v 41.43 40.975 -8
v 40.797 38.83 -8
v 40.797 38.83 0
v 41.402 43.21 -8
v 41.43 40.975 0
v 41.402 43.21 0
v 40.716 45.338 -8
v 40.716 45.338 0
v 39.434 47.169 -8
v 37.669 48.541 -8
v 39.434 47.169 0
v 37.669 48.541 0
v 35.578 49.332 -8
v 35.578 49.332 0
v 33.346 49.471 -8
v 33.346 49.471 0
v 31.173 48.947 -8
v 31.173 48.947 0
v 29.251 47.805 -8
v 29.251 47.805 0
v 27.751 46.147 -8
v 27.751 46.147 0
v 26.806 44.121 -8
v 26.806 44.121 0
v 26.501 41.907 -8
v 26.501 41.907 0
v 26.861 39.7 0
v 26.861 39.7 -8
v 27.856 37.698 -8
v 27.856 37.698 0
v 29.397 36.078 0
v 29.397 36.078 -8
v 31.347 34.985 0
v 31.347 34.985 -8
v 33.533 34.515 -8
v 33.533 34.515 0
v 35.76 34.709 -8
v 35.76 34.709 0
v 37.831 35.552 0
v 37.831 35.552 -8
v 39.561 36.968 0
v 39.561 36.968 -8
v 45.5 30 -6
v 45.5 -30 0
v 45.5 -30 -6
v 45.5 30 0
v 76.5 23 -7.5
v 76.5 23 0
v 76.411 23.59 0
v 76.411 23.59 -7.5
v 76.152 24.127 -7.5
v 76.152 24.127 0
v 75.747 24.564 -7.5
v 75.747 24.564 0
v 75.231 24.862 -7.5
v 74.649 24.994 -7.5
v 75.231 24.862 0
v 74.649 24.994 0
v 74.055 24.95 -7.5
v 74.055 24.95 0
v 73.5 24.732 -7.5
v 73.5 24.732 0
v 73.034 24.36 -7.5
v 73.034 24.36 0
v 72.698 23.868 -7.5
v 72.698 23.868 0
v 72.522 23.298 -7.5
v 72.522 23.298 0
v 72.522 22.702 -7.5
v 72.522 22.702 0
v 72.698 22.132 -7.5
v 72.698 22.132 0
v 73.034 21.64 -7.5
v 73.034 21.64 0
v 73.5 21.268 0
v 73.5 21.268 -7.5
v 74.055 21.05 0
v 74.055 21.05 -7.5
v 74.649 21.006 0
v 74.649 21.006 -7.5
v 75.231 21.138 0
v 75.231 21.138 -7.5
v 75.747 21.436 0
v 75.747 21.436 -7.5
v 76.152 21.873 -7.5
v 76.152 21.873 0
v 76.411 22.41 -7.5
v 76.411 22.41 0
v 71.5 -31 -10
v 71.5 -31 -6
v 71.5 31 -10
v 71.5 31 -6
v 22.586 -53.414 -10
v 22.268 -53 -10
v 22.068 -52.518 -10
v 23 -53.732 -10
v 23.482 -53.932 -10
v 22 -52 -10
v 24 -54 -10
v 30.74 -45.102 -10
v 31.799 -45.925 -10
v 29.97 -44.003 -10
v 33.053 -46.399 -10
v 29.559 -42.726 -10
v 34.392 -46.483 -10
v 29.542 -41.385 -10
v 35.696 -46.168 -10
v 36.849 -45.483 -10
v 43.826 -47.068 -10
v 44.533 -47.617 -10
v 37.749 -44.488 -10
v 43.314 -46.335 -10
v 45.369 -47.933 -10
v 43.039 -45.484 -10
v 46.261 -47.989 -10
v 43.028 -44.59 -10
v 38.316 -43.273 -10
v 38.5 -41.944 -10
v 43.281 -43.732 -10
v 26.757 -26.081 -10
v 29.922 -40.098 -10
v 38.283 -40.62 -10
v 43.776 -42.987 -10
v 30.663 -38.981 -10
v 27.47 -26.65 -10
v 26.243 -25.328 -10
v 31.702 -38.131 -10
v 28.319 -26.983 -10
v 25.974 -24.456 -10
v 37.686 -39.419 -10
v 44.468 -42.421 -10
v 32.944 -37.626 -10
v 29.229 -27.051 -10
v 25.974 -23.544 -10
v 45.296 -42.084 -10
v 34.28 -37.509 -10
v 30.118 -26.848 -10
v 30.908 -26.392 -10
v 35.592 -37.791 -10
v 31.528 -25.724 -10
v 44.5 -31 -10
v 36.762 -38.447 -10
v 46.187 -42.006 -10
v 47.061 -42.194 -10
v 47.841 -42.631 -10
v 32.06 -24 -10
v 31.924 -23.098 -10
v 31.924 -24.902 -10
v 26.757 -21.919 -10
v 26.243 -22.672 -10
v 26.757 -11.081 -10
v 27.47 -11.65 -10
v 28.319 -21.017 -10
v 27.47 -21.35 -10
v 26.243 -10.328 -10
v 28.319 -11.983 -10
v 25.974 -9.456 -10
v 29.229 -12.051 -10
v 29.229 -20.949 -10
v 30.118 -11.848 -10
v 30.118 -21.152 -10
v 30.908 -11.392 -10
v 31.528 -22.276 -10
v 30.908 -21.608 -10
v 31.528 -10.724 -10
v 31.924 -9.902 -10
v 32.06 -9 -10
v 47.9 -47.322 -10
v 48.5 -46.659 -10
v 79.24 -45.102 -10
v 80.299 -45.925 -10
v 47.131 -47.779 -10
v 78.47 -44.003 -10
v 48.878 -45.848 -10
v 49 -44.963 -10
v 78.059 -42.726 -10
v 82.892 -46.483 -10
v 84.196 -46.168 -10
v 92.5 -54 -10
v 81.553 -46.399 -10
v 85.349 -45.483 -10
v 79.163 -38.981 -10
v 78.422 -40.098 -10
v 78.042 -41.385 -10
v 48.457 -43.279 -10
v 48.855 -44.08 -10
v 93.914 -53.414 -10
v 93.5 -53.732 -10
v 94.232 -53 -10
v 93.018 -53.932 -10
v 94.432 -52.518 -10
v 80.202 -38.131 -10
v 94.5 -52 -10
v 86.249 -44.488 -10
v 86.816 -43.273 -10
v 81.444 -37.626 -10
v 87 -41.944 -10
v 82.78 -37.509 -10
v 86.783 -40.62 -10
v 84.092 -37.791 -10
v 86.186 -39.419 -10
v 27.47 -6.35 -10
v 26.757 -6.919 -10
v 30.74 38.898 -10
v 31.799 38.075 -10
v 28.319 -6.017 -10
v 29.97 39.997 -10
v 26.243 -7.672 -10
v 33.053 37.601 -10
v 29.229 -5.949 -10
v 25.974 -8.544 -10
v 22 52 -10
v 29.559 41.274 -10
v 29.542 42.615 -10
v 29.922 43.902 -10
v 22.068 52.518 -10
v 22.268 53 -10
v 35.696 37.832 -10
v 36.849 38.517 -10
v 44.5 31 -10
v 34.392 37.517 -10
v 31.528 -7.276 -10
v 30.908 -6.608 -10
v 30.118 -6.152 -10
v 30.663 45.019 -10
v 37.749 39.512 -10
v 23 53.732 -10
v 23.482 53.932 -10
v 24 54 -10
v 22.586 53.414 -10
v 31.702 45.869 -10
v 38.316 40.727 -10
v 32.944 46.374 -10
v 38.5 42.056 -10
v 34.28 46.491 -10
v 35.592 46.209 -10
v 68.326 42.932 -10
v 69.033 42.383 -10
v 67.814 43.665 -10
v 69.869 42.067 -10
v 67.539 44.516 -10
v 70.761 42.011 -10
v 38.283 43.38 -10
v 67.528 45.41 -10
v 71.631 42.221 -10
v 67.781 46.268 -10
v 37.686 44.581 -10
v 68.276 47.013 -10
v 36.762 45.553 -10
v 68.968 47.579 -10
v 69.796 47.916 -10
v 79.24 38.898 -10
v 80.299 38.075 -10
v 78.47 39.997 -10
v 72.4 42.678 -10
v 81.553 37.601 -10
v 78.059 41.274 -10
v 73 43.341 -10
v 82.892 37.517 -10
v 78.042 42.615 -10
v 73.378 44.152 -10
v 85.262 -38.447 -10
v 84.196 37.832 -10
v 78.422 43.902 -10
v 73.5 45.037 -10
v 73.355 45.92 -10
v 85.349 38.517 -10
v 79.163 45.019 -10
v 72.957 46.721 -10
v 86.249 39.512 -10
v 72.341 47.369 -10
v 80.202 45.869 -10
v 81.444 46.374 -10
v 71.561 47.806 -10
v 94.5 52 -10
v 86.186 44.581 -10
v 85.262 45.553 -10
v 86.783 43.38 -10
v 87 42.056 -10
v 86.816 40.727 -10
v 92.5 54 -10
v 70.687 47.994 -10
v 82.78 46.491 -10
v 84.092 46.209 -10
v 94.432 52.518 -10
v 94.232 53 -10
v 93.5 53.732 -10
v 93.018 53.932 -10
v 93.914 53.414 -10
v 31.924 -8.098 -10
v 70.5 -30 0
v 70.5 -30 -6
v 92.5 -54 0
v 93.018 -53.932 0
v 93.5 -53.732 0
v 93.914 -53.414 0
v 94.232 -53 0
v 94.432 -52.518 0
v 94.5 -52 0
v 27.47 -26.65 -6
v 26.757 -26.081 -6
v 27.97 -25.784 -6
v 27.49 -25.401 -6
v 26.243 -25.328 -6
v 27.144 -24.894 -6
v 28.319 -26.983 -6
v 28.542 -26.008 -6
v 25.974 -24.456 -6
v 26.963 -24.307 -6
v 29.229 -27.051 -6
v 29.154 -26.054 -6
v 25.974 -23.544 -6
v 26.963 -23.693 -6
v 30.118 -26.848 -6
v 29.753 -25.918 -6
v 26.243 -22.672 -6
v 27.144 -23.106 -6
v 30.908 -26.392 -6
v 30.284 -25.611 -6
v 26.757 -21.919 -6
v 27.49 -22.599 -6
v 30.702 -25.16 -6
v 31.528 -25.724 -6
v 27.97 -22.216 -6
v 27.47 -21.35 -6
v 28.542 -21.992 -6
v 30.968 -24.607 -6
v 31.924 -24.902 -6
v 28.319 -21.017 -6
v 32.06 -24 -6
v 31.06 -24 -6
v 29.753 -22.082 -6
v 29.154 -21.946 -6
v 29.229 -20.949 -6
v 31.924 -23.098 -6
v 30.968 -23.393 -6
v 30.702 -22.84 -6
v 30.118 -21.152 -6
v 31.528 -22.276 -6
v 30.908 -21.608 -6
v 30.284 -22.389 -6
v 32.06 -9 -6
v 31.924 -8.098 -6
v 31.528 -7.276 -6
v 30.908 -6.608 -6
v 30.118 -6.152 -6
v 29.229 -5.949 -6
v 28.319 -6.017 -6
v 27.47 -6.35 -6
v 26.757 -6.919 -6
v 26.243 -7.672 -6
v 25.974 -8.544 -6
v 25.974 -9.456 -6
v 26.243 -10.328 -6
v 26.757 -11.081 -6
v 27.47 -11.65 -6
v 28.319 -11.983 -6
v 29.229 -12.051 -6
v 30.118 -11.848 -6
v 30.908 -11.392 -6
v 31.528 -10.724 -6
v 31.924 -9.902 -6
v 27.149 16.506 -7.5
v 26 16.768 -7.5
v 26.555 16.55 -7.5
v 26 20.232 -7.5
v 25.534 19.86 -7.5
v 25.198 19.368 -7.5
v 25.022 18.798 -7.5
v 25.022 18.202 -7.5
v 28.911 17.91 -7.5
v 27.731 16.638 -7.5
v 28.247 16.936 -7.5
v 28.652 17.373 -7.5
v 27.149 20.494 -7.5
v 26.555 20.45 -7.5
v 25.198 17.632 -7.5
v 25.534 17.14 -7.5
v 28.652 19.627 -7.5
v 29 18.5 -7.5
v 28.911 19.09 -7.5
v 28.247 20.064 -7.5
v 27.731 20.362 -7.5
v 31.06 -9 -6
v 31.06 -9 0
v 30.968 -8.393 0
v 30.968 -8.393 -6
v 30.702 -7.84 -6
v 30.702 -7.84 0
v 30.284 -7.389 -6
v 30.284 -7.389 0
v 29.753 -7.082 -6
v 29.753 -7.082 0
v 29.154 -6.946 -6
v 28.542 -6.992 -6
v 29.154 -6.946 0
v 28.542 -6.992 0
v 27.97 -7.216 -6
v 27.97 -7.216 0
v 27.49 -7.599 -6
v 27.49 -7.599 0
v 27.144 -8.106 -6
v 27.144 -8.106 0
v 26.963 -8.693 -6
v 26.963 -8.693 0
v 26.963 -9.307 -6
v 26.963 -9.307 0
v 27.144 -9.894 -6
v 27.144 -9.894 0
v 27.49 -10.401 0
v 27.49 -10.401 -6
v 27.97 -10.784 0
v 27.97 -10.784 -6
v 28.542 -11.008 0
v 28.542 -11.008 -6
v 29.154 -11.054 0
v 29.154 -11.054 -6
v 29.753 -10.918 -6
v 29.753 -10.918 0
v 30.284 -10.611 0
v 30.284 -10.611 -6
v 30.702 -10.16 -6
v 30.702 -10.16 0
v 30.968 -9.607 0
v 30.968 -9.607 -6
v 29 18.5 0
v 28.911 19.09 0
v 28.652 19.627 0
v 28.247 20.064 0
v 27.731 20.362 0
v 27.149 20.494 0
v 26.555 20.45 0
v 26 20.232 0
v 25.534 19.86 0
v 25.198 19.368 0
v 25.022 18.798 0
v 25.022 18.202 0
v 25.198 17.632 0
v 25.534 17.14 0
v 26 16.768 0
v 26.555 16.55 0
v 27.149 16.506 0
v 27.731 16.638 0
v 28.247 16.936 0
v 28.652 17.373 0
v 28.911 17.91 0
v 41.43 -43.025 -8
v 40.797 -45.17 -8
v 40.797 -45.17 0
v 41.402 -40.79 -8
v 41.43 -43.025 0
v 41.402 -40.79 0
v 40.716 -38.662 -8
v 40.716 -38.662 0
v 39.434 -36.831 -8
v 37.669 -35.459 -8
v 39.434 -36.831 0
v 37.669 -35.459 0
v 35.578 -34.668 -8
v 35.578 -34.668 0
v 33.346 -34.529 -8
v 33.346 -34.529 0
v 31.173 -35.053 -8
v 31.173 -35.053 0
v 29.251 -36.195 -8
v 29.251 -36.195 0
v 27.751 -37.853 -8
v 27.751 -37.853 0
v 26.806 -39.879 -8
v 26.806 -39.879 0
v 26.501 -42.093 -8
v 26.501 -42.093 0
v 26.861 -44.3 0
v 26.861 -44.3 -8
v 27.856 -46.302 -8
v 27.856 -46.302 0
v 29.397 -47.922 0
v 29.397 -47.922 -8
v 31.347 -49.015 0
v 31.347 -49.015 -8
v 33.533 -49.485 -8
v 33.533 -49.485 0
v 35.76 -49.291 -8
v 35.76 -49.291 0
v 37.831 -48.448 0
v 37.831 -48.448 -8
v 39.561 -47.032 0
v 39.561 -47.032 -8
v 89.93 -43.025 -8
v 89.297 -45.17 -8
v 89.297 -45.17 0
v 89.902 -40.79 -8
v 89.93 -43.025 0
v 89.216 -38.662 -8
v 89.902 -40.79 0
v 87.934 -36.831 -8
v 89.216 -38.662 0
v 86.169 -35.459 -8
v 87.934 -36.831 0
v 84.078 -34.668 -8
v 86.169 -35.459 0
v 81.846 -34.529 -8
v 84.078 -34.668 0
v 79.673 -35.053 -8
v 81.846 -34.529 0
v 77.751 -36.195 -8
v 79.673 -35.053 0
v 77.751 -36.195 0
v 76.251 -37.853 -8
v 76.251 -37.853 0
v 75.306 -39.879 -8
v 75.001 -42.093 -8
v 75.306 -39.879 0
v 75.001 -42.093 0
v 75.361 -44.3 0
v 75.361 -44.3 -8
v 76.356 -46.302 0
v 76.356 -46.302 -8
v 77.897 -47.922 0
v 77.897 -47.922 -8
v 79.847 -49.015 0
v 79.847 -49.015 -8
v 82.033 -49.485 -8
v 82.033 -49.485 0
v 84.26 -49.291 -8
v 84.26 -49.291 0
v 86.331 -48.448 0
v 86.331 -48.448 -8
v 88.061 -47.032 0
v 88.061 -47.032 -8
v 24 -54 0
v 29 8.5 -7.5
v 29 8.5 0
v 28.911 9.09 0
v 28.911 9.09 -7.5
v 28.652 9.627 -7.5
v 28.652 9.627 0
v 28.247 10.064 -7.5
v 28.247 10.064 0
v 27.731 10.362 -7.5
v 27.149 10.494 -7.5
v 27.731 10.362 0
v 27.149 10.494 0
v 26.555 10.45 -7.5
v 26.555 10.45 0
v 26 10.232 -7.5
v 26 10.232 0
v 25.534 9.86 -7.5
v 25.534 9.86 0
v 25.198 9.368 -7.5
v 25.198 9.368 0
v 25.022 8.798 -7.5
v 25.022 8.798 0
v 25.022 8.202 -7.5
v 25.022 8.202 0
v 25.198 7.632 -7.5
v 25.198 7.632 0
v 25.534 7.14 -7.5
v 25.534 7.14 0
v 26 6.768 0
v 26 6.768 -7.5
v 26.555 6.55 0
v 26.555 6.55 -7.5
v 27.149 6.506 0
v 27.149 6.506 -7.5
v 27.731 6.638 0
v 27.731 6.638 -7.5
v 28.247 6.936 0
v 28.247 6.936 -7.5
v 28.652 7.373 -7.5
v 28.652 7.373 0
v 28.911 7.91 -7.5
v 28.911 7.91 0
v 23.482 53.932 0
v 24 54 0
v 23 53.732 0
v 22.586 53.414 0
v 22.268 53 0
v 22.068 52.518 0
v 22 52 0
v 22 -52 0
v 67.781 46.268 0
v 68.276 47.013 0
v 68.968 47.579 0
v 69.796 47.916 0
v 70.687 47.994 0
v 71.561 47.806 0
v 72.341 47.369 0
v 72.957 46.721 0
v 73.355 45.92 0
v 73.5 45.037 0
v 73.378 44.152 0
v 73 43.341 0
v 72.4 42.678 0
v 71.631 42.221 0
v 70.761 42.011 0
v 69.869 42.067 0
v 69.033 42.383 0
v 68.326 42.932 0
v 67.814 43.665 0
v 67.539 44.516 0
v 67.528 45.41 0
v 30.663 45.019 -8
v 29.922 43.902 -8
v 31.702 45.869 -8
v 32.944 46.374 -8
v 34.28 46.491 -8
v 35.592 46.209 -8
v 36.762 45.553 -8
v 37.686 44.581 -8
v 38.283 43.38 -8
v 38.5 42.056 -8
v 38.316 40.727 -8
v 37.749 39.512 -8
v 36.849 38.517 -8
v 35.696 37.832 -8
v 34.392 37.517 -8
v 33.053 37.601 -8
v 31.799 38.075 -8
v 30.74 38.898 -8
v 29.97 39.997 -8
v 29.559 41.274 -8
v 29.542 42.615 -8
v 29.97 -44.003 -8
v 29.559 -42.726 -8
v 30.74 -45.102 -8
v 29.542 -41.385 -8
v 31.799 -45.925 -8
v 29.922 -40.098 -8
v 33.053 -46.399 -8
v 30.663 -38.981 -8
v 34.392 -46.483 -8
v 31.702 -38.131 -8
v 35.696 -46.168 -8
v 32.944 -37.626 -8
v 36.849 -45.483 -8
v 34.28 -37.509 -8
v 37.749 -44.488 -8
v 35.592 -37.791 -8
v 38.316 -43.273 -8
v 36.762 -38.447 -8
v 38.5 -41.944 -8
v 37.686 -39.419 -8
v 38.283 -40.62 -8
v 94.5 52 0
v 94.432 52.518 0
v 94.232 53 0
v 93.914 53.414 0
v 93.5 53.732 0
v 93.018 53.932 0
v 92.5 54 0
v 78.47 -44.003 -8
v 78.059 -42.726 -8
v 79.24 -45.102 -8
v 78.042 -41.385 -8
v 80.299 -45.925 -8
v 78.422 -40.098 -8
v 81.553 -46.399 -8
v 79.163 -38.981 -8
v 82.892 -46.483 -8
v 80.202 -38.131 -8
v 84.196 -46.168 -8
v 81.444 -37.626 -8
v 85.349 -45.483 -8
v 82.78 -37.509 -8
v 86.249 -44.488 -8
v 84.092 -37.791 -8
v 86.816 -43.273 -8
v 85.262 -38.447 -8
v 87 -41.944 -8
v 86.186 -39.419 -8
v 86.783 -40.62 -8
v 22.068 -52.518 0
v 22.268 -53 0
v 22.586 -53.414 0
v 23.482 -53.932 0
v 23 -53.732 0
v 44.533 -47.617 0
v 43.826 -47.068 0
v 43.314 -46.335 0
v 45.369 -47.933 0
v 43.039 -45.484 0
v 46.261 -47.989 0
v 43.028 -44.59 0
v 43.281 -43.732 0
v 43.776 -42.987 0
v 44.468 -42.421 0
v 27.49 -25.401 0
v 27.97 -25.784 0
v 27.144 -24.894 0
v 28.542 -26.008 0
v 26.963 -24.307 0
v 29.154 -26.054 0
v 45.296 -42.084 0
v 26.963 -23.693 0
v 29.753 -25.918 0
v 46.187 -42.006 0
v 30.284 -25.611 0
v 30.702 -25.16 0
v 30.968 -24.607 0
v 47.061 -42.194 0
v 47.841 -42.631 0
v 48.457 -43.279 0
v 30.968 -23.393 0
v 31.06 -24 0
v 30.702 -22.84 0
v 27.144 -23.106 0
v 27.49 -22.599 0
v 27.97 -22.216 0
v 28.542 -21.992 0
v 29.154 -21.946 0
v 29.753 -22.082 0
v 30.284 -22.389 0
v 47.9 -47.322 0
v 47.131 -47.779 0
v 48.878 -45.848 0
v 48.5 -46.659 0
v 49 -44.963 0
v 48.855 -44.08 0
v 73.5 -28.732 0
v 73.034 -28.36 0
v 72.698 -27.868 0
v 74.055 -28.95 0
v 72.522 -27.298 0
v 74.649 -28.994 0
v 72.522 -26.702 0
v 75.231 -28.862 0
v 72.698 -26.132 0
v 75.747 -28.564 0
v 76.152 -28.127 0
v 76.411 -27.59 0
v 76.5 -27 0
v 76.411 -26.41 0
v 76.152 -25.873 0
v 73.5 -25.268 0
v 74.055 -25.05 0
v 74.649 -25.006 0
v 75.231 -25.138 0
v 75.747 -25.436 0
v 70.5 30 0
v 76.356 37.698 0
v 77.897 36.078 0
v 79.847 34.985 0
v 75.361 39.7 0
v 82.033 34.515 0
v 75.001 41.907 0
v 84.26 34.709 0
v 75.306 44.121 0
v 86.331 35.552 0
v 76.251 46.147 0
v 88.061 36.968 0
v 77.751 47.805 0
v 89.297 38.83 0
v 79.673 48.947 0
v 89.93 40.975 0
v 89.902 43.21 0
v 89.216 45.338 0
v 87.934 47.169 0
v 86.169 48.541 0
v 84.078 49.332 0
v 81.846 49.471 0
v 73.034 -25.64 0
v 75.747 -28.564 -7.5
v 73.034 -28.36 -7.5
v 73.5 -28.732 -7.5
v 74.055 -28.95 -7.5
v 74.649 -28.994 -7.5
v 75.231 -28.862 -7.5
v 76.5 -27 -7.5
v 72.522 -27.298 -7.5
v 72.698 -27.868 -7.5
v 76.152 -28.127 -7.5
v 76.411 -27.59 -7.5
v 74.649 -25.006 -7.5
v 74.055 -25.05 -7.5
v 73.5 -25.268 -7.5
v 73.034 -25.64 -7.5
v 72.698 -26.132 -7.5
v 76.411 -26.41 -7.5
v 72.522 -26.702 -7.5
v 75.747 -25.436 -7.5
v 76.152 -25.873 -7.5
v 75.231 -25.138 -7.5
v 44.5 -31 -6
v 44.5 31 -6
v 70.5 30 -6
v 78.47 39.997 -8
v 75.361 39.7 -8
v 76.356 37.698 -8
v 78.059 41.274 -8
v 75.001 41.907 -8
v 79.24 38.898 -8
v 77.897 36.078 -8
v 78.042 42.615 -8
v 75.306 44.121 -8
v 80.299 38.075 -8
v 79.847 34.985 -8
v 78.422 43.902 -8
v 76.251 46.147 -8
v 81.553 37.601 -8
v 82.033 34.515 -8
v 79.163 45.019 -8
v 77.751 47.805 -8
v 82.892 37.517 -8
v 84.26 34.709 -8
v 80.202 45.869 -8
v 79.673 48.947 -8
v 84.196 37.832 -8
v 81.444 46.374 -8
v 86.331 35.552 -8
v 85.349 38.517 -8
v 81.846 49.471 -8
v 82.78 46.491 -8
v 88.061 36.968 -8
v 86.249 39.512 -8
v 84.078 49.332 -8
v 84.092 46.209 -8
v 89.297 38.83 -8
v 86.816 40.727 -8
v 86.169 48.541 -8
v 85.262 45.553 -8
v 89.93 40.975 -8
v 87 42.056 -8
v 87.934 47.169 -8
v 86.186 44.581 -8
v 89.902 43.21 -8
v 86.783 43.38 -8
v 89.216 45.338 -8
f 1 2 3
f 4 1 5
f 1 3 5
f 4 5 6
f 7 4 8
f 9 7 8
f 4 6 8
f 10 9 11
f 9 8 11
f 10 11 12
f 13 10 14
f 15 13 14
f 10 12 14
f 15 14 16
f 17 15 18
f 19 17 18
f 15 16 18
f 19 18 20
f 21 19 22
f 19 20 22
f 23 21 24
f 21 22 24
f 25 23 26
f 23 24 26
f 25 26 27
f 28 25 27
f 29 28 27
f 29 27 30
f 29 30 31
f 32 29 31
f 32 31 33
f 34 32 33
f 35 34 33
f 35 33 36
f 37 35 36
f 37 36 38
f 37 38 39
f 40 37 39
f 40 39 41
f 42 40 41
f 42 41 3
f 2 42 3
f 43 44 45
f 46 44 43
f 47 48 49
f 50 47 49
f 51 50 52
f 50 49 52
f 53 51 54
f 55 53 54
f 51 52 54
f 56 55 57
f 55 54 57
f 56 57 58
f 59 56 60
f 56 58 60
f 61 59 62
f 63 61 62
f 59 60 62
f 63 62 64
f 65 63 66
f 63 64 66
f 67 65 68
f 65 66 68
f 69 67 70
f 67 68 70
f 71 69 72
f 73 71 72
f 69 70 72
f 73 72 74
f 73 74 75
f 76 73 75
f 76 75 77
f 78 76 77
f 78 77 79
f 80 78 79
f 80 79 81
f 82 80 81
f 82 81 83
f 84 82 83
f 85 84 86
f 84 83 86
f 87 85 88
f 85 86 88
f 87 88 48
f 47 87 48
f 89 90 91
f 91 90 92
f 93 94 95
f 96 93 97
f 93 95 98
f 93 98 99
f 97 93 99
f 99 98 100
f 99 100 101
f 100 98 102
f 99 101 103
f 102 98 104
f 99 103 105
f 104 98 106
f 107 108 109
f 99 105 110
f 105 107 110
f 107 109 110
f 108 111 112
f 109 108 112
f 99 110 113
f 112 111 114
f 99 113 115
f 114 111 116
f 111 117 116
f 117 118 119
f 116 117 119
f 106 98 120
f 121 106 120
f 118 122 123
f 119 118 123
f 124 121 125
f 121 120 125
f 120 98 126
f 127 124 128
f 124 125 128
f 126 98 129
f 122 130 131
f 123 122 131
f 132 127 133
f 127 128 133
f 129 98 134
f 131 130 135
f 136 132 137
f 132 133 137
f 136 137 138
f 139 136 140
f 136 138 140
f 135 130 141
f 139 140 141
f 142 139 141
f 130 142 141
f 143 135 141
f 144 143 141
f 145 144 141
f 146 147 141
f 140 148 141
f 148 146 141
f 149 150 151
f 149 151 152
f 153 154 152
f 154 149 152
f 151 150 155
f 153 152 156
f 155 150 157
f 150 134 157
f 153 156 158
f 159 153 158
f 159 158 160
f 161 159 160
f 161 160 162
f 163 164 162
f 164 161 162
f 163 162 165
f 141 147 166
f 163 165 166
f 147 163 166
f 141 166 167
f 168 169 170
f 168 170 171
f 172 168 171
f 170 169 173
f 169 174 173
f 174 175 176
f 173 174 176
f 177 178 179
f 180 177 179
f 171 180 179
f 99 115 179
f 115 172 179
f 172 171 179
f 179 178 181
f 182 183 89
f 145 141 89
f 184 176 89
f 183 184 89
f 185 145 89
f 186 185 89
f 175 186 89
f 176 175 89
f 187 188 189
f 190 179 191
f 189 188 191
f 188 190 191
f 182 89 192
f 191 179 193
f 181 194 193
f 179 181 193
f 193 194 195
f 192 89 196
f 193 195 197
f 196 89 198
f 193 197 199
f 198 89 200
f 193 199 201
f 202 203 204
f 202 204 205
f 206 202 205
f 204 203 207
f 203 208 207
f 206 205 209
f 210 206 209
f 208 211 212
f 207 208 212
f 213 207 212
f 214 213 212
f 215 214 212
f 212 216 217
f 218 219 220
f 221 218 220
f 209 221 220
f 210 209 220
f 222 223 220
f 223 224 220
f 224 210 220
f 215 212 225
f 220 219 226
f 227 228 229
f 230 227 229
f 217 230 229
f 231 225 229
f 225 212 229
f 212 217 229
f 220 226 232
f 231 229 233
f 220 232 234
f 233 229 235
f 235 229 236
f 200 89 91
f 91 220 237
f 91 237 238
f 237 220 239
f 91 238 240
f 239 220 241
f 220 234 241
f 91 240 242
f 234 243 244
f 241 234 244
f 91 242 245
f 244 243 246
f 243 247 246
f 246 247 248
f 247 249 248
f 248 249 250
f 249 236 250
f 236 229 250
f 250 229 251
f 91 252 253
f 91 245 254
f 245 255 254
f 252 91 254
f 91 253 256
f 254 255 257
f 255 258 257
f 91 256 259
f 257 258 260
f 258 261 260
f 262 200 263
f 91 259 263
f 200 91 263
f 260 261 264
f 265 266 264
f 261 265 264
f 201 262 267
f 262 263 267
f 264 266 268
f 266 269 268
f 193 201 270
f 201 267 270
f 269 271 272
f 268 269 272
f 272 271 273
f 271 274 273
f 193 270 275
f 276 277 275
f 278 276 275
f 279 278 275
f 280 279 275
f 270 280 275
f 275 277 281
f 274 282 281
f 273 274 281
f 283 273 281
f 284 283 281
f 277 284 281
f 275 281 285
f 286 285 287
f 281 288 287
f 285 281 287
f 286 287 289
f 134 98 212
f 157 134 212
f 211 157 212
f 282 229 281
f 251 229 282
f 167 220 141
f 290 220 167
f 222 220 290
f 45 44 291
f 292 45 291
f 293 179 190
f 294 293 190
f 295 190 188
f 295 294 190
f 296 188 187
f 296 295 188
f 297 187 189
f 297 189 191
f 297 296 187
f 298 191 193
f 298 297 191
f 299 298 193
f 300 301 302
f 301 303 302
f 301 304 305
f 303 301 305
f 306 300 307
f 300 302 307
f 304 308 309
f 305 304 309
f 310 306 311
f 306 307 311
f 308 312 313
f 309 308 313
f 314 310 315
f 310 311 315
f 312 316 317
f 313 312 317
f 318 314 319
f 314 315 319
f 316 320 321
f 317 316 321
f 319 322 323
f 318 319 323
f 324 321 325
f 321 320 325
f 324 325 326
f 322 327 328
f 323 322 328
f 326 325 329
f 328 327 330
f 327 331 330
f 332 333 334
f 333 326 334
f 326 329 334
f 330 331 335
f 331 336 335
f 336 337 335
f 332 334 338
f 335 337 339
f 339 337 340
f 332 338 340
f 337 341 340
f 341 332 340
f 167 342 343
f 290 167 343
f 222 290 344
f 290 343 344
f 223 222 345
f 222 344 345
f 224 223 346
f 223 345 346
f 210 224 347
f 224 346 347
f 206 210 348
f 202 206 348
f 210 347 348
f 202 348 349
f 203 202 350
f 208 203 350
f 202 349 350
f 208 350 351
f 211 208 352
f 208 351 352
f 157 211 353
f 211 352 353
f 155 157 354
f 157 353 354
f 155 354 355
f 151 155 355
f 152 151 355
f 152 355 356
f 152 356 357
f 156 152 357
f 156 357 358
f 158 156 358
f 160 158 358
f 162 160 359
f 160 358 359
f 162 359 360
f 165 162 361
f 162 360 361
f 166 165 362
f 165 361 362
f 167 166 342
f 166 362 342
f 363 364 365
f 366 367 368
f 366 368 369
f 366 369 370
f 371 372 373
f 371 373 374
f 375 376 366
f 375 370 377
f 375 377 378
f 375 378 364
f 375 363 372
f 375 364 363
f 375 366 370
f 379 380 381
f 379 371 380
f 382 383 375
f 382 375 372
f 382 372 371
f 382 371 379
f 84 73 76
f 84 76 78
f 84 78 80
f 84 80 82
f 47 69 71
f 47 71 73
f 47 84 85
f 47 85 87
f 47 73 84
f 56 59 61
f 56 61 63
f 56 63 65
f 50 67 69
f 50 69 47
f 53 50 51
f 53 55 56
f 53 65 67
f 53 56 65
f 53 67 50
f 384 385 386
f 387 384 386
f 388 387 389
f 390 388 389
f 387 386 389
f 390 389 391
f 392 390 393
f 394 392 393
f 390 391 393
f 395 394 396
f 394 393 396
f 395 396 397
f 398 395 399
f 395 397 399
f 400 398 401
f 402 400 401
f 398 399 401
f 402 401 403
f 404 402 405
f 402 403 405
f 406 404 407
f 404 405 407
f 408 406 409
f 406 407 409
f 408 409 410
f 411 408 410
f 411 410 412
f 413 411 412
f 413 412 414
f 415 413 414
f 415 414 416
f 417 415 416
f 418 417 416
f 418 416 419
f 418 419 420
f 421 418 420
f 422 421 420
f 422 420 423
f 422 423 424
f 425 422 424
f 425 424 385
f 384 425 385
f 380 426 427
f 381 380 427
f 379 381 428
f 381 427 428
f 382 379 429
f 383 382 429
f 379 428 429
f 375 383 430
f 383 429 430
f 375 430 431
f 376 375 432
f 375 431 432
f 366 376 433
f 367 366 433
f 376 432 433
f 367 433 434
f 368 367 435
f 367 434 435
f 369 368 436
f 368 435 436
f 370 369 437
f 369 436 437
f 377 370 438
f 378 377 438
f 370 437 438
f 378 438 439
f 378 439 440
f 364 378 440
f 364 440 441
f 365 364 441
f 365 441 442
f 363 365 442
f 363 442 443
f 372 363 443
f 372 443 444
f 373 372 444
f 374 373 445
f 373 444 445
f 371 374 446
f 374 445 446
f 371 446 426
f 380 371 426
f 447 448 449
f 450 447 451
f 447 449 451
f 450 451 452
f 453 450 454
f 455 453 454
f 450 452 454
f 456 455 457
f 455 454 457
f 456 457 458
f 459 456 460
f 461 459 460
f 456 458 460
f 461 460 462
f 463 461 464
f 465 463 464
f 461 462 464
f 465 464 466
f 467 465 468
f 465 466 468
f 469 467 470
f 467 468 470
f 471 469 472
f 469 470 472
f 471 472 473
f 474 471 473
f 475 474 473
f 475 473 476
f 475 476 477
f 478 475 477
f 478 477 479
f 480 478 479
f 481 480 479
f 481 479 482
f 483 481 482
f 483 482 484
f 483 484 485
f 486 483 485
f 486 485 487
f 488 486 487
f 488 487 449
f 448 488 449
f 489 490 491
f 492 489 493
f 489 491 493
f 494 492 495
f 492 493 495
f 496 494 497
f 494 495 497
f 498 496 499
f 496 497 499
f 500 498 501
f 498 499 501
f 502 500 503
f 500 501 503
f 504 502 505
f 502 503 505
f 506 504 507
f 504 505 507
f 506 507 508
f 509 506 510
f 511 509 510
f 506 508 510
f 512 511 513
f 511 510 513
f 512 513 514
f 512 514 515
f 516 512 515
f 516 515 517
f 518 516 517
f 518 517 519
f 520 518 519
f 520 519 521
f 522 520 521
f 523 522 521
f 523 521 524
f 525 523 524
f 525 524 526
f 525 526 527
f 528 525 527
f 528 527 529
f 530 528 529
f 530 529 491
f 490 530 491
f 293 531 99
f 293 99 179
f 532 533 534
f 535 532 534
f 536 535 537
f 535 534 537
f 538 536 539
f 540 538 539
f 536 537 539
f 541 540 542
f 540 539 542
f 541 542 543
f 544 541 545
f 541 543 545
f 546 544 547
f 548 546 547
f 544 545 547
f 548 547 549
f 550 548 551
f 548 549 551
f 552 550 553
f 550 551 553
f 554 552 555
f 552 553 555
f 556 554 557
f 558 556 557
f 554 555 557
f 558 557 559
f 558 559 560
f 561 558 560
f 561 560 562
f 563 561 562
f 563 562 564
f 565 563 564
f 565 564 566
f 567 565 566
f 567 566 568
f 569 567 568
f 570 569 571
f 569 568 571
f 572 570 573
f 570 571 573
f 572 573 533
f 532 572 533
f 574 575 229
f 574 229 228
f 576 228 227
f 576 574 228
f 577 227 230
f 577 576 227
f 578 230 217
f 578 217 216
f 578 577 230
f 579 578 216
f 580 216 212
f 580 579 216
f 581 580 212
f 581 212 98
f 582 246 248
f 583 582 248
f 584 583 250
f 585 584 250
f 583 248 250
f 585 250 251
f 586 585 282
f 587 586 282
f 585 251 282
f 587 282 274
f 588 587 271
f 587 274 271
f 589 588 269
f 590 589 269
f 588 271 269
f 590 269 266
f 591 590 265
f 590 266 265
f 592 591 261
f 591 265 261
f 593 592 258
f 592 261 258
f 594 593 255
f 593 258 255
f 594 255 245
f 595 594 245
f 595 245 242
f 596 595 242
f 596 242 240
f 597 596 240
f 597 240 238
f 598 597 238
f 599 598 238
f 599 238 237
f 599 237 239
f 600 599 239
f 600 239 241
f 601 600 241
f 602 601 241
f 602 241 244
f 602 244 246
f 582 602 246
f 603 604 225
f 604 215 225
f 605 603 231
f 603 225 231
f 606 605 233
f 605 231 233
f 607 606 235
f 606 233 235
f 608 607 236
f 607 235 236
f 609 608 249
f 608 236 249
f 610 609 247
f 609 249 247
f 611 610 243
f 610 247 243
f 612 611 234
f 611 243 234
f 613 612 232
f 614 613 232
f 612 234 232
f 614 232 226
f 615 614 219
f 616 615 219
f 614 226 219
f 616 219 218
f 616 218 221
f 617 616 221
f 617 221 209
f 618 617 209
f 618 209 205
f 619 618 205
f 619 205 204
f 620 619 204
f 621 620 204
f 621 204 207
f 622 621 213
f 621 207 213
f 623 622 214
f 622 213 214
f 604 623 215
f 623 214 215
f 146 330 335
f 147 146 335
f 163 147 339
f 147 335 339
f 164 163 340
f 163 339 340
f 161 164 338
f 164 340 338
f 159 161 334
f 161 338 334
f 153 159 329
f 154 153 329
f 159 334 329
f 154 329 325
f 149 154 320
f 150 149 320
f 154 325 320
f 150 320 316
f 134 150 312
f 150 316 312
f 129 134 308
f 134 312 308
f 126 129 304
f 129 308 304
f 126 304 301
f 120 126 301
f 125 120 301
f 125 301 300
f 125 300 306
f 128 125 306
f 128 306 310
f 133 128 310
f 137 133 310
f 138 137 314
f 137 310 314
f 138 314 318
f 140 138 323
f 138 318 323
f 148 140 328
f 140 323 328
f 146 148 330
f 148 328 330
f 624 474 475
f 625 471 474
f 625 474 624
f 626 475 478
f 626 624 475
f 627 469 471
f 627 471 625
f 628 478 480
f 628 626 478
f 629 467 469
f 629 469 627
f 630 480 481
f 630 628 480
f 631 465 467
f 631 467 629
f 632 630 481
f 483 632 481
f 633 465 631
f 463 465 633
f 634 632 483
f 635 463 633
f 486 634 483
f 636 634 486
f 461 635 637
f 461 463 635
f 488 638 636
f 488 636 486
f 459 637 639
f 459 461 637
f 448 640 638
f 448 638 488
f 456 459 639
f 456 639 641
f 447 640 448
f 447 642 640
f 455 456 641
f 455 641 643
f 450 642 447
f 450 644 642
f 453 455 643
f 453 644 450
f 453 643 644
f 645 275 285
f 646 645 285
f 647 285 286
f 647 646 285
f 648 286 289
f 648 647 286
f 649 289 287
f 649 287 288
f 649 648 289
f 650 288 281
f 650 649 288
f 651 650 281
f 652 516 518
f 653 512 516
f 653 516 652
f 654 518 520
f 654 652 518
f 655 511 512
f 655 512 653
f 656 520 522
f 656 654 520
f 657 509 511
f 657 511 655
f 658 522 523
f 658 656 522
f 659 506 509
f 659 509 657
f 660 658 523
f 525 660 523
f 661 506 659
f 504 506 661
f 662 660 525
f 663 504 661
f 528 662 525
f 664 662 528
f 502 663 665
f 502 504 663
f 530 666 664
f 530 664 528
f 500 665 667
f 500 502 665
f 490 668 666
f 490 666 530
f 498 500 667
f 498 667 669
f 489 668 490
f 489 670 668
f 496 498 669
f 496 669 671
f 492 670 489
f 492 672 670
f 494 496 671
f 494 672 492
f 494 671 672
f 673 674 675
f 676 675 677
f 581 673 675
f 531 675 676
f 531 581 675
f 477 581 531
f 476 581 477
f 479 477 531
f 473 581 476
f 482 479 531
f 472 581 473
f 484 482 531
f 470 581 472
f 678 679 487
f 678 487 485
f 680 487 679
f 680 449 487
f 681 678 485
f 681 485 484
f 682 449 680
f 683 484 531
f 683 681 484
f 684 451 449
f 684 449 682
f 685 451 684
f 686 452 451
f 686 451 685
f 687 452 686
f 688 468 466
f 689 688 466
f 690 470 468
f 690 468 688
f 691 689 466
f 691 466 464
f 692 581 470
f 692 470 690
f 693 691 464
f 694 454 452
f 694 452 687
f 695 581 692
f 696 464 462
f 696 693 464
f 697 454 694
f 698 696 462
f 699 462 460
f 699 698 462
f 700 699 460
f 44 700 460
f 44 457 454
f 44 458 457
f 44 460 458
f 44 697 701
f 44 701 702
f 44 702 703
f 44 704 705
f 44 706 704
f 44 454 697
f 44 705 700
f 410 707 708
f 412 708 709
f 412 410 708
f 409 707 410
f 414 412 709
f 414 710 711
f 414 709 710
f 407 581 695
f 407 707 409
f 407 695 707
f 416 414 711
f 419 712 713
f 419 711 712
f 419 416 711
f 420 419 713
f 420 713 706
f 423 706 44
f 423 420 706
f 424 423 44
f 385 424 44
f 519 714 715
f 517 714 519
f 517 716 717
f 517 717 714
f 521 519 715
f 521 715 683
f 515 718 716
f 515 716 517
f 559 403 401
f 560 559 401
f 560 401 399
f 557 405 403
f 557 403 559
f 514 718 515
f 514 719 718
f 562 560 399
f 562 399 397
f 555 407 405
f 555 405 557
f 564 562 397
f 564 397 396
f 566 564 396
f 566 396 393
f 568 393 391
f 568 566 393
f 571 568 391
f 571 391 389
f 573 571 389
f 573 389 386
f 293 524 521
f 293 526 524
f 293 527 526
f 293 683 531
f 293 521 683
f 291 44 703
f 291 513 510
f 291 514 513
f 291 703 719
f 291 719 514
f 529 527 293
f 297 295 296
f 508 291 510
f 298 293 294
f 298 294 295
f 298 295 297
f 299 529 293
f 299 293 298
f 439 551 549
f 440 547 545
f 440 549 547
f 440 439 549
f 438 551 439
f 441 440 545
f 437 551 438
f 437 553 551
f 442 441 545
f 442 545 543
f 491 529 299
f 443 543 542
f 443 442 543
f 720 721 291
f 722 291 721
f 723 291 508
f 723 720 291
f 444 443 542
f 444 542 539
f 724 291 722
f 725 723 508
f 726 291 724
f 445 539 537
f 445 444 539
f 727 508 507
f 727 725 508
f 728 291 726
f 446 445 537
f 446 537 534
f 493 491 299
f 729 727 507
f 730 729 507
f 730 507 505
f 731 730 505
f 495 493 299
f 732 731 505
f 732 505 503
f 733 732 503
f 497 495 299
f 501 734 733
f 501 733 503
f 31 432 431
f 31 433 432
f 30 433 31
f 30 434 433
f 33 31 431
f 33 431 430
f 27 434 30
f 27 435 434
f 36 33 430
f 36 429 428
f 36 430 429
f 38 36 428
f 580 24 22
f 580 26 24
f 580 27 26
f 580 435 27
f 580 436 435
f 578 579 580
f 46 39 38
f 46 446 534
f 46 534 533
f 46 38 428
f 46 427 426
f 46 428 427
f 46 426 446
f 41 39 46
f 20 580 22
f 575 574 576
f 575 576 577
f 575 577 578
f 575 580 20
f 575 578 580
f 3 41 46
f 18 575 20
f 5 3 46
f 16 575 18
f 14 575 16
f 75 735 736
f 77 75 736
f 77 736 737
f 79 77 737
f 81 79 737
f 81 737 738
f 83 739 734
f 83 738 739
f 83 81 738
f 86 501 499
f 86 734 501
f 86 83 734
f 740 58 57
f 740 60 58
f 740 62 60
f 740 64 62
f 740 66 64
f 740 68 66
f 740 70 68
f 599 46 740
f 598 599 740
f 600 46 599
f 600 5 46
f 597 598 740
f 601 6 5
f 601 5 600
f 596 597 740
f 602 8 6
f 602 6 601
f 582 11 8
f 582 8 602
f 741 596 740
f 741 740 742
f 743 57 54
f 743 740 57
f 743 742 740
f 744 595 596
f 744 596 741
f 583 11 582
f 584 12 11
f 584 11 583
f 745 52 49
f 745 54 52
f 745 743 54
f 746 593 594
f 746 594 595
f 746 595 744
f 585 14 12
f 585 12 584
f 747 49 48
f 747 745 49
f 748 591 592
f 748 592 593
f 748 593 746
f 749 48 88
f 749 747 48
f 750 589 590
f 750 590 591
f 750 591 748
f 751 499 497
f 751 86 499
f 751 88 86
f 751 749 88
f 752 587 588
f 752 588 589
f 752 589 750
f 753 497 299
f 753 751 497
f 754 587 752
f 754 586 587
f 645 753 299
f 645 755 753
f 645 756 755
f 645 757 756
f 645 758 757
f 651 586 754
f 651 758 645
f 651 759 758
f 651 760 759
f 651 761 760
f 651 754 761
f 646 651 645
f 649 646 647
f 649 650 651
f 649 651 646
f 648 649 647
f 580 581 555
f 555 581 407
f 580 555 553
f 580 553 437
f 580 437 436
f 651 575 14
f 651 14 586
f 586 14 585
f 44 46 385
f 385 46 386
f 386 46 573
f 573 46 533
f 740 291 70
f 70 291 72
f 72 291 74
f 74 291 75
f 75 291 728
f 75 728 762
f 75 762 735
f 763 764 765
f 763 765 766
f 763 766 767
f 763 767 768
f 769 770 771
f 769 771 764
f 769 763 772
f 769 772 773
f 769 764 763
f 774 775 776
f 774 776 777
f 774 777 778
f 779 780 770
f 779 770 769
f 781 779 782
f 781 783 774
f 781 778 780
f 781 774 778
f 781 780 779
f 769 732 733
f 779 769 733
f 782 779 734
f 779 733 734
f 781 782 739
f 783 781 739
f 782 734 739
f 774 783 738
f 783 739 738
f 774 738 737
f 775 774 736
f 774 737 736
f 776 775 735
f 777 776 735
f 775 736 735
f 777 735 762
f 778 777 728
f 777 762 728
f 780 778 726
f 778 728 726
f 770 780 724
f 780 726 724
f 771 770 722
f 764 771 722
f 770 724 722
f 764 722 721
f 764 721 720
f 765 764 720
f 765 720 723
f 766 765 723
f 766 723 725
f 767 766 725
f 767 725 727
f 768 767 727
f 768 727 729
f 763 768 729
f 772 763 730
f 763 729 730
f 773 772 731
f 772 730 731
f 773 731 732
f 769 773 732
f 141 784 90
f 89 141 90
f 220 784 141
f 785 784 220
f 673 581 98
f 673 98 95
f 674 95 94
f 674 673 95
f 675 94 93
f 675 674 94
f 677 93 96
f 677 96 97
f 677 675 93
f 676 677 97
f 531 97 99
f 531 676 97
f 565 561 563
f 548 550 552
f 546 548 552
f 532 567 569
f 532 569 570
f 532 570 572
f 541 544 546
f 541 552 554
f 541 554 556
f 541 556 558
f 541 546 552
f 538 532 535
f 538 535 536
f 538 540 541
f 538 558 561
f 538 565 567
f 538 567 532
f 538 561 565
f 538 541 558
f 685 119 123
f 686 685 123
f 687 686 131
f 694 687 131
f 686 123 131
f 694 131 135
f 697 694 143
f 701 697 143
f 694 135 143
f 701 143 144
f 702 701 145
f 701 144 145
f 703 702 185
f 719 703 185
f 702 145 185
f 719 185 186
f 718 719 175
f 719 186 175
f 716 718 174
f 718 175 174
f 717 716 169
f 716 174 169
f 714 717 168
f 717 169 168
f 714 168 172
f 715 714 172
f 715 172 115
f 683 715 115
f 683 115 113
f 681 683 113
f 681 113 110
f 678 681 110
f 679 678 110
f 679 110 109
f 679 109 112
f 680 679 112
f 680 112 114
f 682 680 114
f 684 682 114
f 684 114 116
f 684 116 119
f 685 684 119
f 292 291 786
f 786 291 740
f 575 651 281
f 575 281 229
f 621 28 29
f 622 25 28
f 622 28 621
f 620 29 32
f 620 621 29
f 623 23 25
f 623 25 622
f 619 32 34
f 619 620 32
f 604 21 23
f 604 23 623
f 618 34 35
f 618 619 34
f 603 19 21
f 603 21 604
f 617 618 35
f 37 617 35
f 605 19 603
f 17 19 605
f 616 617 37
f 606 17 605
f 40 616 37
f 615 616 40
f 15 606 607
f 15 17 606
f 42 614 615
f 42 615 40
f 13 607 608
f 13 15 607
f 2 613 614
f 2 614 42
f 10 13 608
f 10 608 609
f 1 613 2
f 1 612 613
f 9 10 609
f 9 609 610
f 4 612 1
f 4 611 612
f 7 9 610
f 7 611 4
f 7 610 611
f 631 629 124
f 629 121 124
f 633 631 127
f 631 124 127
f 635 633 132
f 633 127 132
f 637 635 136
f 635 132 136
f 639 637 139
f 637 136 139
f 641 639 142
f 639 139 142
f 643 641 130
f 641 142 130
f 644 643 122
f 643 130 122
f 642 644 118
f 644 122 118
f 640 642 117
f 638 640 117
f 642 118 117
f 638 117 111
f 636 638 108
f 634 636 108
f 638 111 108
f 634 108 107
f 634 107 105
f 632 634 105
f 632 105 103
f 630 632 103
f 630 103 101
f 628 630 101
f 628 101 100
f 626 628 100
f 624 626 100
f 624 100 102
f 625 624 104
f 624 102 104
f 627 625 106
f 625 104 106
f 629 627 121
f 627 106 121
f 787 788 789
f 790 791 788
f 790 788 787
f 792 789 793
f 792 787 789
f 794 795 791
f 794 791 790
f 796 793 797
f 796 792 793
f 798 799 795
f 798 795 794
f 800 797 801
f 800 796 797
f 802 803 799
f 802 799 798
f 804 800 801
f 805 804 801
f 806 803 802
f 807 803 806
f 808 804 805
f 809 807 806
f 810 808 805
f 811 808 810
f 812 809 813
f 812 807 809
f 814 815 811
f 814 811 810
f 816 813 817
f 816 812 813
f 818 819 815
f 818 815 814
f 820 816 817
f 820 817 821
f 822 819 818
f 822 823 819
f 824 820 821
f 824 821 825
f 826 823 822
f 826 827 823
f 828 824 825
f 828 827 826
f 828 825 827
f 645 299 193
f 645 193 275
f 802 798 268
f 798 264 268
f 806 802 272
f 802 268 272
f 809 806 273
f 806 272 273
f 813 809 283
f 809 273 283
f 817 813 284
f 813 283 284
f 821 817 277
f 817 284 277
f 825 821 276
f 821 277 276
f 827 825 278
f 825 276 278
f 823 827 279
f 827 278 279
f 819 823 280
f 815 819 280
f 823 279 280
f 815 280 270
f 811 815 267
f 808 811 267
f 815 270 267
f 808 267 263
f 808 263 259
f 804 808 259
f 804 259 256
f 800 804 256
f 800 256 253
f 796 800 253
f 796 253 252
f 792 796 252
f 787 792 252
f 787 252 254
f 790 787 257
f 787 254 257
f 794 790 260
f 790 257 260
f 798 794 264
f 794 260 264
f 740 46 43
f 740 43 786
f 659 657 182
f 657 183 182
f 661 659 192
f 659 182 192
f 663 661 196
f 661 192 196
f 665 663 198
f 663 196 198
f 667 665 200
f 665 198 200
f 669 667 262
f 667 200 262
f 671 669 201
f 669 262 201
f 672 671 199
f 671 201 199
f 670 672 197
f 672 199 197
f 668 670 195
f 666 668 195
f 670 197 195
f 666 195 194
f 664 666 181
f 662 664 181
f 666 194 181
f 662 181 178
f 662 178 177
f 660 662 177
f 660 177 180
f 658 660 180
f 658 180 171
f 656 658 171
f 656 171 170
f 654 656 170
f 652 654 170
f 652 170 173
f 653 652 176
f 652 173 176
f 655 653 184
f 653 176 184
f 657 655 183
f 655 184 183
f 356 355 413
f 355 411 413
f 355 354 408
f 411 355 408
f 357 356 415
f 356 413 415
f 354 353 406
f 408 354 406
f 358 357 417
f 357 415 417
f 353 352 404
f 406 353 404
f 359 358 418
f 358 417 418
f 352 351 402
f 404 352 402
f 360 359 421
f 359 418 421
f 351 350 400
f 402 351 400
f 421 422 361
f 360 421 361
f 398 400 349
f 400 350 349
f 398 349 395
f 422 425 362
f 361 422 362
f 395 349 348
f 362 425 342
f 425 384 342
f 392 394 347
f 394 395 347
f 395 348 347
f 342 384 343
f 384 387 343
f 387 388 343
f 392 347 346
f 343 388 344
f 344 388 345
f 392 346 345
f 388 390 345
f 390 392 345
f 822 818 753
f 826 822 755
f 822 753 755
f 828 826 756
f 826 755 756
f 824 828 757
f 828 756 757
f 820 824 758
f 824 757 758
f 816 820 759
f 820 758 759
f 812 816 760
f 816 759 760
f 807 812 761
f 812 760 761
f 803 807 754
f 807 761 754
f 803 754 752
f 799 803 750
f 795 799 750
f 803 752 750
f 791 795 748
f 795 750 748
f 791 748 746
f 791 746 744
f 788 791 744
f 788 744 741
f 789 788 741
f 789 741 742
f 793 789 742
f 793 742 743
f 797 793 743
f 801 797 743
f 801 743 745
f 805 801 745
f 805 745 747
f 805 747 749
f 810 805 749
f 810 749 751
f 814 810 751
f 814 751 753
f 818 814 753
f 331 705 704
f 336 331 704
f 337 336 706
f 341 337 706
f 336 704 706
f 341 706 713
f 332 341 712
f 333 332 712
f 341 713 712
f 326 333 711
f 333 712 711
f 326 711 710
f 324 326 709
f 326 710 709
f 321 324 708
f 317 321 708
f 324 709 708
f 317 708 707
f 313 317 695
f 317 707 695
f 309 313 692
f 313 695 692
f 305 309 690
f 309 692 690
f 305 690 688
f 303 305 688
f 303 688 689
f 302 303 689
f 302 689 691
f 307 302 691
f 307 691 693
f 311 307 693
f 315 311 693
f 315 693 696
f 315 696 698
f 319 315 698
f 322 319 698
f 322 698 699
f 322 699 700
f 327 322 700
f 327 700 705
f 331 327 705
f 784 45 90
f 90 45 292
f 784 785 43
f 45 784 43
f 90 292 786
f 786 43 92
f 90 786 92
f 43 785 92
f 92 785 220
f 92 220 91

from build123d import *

# Parameters (mm, degrees)
SKETCH1_R                       = 2.06
SKETCH1_W                       = 25
SKETCH1_H                       = 60
BOSS_EXTRUDE1_DEPTH             = 10
CUT_EXTRUDE1_START              = -6
SKETCH2_R                       = 3.06
SKETCH2_W                       = 27
SKETCH2_H                       = 62
CUT_EXTRUDE1_DEPTH              = 4
SKETCH3_R                       = 2
CUT_EXTRUDE2_DEPTH              = 7.5
CBORE_FOR_M8_SHCS1_D            = 9
CBORE_FOR_M8_SHCS1_CBORE_D      = 15
CBORE_FOR_M8_SHCS1_CBORE_DEPTH  = 8
F_6_0MM_CLEARANCE_DOWEL_HOLE1_D = 6


with BuildPart() as part:
    # Sketch1 → Boss-Extrude1 (new body)
    with BuildSketch(Plane.XY):
        with BuildLine():
            Line((22, 52), (22, -52))
            ThreePointArc((22, -52), (22.585786438, -53.414213562), (24, -54))
            Line((24, -54), (36, -54))
            Line((36, -54), (92.5, -54))
            ThreePointArc((92.5, -54), (93.914213562, -53.414213562), (94.5, -52))
            Line((94.5, -52), (94.5, 52))
            ThreePointArc((94.5, 52), (93.914213562, 53.414213562), (92.5, 54))
            Line((92.5, 54), (24, 54))
            ThreePointArc((24, 54), (22.585786438, 53.414213562), (22, 52))
        make_face()
        with Locations((29, -24)):
            Circle(SKETCH1_R, mode=Mode.SUBTRACT)
        with Locations((29, -9)):
            Circle(SKETCH1_R, mode=Mode.SUBTRACT)
        with Locations((58, 0)):
            Rectangle(SKETCH1_W, SKETCH1_H, mode=Mode.SUBTRACT)
    extrude(amount=-BOSS_EXTRUDE1_DEPTH)

    # Sketch2 → Cut-Extrude1 (cut)
    with BuildSketch(Plane.XY.offset(CUT_EXTRUDE1_START)):
        with Locations((29, -9)):
            Circle(SKETCH2_R)
        with Locations((29, -24)):
            Circle(SKETCH2_R)
        with Locations((58, 0)):
            Rectangle(SKETCH2_W, SKETCH2_H)
    extrude(amount=-CUT_EXTRUDE1_DEPTH, mode=Mode.SUBTRACT)

    # Sketch3 → Cut-Extrude2 (cut)
    with BuildSketch(Plane.XY):
        with Locations((27, 8.5)):
            Circle(SKETCH3_R)
        with Locations((27, 18.5)):
            Circle(SKETCH3_R)
        with Locations((74.5, 23)):
            Circle(SKETCH3_R)
        with Locations((74.5, -27)):
            Circle(SKETCH3_R)
    extrude(amount=-CUT_EXTRUDE2_DEPTH, mode=Mode.SUBTRACT)

    # CBORE for M8 SHCS1 (through all)
    with Locations(Plane(origin=(0, 0, 0), x_dir=(0.9063077870366375, -0.4226182617407263, 0), z_dir=(0, 0, 1))):
        with Locations((57.020425437, 72.930933649), (13.064497766, 52.433947955), (48.564431752, -23.695906156), (92.520359424, -3.198920462)):
            CounterBoreHole(CBORE_FOR_M8_SHCS1_D / 2, CBORE_FOR_M8_SHCS1_CBORE_D / 2, CBORE_FOR_M8_SHCS1_CBORE_DEPTH)

    # Ø6.0mm Clearance Dowel Hole1 (through all)
    with Locations(Plane(origin=(0, 0, 0), x_dir=(0.9063077870366375, -0.4226182617407263, 0), z_dir=(0, 0, 1))):
        with Locations((44.876877208, 70.578437869), (60.707979982, -21.343410377)):
            Hole(F_6_0MM_CLEARANCE_DOWEL_HOLE1_D / 2)


solid = part.part
